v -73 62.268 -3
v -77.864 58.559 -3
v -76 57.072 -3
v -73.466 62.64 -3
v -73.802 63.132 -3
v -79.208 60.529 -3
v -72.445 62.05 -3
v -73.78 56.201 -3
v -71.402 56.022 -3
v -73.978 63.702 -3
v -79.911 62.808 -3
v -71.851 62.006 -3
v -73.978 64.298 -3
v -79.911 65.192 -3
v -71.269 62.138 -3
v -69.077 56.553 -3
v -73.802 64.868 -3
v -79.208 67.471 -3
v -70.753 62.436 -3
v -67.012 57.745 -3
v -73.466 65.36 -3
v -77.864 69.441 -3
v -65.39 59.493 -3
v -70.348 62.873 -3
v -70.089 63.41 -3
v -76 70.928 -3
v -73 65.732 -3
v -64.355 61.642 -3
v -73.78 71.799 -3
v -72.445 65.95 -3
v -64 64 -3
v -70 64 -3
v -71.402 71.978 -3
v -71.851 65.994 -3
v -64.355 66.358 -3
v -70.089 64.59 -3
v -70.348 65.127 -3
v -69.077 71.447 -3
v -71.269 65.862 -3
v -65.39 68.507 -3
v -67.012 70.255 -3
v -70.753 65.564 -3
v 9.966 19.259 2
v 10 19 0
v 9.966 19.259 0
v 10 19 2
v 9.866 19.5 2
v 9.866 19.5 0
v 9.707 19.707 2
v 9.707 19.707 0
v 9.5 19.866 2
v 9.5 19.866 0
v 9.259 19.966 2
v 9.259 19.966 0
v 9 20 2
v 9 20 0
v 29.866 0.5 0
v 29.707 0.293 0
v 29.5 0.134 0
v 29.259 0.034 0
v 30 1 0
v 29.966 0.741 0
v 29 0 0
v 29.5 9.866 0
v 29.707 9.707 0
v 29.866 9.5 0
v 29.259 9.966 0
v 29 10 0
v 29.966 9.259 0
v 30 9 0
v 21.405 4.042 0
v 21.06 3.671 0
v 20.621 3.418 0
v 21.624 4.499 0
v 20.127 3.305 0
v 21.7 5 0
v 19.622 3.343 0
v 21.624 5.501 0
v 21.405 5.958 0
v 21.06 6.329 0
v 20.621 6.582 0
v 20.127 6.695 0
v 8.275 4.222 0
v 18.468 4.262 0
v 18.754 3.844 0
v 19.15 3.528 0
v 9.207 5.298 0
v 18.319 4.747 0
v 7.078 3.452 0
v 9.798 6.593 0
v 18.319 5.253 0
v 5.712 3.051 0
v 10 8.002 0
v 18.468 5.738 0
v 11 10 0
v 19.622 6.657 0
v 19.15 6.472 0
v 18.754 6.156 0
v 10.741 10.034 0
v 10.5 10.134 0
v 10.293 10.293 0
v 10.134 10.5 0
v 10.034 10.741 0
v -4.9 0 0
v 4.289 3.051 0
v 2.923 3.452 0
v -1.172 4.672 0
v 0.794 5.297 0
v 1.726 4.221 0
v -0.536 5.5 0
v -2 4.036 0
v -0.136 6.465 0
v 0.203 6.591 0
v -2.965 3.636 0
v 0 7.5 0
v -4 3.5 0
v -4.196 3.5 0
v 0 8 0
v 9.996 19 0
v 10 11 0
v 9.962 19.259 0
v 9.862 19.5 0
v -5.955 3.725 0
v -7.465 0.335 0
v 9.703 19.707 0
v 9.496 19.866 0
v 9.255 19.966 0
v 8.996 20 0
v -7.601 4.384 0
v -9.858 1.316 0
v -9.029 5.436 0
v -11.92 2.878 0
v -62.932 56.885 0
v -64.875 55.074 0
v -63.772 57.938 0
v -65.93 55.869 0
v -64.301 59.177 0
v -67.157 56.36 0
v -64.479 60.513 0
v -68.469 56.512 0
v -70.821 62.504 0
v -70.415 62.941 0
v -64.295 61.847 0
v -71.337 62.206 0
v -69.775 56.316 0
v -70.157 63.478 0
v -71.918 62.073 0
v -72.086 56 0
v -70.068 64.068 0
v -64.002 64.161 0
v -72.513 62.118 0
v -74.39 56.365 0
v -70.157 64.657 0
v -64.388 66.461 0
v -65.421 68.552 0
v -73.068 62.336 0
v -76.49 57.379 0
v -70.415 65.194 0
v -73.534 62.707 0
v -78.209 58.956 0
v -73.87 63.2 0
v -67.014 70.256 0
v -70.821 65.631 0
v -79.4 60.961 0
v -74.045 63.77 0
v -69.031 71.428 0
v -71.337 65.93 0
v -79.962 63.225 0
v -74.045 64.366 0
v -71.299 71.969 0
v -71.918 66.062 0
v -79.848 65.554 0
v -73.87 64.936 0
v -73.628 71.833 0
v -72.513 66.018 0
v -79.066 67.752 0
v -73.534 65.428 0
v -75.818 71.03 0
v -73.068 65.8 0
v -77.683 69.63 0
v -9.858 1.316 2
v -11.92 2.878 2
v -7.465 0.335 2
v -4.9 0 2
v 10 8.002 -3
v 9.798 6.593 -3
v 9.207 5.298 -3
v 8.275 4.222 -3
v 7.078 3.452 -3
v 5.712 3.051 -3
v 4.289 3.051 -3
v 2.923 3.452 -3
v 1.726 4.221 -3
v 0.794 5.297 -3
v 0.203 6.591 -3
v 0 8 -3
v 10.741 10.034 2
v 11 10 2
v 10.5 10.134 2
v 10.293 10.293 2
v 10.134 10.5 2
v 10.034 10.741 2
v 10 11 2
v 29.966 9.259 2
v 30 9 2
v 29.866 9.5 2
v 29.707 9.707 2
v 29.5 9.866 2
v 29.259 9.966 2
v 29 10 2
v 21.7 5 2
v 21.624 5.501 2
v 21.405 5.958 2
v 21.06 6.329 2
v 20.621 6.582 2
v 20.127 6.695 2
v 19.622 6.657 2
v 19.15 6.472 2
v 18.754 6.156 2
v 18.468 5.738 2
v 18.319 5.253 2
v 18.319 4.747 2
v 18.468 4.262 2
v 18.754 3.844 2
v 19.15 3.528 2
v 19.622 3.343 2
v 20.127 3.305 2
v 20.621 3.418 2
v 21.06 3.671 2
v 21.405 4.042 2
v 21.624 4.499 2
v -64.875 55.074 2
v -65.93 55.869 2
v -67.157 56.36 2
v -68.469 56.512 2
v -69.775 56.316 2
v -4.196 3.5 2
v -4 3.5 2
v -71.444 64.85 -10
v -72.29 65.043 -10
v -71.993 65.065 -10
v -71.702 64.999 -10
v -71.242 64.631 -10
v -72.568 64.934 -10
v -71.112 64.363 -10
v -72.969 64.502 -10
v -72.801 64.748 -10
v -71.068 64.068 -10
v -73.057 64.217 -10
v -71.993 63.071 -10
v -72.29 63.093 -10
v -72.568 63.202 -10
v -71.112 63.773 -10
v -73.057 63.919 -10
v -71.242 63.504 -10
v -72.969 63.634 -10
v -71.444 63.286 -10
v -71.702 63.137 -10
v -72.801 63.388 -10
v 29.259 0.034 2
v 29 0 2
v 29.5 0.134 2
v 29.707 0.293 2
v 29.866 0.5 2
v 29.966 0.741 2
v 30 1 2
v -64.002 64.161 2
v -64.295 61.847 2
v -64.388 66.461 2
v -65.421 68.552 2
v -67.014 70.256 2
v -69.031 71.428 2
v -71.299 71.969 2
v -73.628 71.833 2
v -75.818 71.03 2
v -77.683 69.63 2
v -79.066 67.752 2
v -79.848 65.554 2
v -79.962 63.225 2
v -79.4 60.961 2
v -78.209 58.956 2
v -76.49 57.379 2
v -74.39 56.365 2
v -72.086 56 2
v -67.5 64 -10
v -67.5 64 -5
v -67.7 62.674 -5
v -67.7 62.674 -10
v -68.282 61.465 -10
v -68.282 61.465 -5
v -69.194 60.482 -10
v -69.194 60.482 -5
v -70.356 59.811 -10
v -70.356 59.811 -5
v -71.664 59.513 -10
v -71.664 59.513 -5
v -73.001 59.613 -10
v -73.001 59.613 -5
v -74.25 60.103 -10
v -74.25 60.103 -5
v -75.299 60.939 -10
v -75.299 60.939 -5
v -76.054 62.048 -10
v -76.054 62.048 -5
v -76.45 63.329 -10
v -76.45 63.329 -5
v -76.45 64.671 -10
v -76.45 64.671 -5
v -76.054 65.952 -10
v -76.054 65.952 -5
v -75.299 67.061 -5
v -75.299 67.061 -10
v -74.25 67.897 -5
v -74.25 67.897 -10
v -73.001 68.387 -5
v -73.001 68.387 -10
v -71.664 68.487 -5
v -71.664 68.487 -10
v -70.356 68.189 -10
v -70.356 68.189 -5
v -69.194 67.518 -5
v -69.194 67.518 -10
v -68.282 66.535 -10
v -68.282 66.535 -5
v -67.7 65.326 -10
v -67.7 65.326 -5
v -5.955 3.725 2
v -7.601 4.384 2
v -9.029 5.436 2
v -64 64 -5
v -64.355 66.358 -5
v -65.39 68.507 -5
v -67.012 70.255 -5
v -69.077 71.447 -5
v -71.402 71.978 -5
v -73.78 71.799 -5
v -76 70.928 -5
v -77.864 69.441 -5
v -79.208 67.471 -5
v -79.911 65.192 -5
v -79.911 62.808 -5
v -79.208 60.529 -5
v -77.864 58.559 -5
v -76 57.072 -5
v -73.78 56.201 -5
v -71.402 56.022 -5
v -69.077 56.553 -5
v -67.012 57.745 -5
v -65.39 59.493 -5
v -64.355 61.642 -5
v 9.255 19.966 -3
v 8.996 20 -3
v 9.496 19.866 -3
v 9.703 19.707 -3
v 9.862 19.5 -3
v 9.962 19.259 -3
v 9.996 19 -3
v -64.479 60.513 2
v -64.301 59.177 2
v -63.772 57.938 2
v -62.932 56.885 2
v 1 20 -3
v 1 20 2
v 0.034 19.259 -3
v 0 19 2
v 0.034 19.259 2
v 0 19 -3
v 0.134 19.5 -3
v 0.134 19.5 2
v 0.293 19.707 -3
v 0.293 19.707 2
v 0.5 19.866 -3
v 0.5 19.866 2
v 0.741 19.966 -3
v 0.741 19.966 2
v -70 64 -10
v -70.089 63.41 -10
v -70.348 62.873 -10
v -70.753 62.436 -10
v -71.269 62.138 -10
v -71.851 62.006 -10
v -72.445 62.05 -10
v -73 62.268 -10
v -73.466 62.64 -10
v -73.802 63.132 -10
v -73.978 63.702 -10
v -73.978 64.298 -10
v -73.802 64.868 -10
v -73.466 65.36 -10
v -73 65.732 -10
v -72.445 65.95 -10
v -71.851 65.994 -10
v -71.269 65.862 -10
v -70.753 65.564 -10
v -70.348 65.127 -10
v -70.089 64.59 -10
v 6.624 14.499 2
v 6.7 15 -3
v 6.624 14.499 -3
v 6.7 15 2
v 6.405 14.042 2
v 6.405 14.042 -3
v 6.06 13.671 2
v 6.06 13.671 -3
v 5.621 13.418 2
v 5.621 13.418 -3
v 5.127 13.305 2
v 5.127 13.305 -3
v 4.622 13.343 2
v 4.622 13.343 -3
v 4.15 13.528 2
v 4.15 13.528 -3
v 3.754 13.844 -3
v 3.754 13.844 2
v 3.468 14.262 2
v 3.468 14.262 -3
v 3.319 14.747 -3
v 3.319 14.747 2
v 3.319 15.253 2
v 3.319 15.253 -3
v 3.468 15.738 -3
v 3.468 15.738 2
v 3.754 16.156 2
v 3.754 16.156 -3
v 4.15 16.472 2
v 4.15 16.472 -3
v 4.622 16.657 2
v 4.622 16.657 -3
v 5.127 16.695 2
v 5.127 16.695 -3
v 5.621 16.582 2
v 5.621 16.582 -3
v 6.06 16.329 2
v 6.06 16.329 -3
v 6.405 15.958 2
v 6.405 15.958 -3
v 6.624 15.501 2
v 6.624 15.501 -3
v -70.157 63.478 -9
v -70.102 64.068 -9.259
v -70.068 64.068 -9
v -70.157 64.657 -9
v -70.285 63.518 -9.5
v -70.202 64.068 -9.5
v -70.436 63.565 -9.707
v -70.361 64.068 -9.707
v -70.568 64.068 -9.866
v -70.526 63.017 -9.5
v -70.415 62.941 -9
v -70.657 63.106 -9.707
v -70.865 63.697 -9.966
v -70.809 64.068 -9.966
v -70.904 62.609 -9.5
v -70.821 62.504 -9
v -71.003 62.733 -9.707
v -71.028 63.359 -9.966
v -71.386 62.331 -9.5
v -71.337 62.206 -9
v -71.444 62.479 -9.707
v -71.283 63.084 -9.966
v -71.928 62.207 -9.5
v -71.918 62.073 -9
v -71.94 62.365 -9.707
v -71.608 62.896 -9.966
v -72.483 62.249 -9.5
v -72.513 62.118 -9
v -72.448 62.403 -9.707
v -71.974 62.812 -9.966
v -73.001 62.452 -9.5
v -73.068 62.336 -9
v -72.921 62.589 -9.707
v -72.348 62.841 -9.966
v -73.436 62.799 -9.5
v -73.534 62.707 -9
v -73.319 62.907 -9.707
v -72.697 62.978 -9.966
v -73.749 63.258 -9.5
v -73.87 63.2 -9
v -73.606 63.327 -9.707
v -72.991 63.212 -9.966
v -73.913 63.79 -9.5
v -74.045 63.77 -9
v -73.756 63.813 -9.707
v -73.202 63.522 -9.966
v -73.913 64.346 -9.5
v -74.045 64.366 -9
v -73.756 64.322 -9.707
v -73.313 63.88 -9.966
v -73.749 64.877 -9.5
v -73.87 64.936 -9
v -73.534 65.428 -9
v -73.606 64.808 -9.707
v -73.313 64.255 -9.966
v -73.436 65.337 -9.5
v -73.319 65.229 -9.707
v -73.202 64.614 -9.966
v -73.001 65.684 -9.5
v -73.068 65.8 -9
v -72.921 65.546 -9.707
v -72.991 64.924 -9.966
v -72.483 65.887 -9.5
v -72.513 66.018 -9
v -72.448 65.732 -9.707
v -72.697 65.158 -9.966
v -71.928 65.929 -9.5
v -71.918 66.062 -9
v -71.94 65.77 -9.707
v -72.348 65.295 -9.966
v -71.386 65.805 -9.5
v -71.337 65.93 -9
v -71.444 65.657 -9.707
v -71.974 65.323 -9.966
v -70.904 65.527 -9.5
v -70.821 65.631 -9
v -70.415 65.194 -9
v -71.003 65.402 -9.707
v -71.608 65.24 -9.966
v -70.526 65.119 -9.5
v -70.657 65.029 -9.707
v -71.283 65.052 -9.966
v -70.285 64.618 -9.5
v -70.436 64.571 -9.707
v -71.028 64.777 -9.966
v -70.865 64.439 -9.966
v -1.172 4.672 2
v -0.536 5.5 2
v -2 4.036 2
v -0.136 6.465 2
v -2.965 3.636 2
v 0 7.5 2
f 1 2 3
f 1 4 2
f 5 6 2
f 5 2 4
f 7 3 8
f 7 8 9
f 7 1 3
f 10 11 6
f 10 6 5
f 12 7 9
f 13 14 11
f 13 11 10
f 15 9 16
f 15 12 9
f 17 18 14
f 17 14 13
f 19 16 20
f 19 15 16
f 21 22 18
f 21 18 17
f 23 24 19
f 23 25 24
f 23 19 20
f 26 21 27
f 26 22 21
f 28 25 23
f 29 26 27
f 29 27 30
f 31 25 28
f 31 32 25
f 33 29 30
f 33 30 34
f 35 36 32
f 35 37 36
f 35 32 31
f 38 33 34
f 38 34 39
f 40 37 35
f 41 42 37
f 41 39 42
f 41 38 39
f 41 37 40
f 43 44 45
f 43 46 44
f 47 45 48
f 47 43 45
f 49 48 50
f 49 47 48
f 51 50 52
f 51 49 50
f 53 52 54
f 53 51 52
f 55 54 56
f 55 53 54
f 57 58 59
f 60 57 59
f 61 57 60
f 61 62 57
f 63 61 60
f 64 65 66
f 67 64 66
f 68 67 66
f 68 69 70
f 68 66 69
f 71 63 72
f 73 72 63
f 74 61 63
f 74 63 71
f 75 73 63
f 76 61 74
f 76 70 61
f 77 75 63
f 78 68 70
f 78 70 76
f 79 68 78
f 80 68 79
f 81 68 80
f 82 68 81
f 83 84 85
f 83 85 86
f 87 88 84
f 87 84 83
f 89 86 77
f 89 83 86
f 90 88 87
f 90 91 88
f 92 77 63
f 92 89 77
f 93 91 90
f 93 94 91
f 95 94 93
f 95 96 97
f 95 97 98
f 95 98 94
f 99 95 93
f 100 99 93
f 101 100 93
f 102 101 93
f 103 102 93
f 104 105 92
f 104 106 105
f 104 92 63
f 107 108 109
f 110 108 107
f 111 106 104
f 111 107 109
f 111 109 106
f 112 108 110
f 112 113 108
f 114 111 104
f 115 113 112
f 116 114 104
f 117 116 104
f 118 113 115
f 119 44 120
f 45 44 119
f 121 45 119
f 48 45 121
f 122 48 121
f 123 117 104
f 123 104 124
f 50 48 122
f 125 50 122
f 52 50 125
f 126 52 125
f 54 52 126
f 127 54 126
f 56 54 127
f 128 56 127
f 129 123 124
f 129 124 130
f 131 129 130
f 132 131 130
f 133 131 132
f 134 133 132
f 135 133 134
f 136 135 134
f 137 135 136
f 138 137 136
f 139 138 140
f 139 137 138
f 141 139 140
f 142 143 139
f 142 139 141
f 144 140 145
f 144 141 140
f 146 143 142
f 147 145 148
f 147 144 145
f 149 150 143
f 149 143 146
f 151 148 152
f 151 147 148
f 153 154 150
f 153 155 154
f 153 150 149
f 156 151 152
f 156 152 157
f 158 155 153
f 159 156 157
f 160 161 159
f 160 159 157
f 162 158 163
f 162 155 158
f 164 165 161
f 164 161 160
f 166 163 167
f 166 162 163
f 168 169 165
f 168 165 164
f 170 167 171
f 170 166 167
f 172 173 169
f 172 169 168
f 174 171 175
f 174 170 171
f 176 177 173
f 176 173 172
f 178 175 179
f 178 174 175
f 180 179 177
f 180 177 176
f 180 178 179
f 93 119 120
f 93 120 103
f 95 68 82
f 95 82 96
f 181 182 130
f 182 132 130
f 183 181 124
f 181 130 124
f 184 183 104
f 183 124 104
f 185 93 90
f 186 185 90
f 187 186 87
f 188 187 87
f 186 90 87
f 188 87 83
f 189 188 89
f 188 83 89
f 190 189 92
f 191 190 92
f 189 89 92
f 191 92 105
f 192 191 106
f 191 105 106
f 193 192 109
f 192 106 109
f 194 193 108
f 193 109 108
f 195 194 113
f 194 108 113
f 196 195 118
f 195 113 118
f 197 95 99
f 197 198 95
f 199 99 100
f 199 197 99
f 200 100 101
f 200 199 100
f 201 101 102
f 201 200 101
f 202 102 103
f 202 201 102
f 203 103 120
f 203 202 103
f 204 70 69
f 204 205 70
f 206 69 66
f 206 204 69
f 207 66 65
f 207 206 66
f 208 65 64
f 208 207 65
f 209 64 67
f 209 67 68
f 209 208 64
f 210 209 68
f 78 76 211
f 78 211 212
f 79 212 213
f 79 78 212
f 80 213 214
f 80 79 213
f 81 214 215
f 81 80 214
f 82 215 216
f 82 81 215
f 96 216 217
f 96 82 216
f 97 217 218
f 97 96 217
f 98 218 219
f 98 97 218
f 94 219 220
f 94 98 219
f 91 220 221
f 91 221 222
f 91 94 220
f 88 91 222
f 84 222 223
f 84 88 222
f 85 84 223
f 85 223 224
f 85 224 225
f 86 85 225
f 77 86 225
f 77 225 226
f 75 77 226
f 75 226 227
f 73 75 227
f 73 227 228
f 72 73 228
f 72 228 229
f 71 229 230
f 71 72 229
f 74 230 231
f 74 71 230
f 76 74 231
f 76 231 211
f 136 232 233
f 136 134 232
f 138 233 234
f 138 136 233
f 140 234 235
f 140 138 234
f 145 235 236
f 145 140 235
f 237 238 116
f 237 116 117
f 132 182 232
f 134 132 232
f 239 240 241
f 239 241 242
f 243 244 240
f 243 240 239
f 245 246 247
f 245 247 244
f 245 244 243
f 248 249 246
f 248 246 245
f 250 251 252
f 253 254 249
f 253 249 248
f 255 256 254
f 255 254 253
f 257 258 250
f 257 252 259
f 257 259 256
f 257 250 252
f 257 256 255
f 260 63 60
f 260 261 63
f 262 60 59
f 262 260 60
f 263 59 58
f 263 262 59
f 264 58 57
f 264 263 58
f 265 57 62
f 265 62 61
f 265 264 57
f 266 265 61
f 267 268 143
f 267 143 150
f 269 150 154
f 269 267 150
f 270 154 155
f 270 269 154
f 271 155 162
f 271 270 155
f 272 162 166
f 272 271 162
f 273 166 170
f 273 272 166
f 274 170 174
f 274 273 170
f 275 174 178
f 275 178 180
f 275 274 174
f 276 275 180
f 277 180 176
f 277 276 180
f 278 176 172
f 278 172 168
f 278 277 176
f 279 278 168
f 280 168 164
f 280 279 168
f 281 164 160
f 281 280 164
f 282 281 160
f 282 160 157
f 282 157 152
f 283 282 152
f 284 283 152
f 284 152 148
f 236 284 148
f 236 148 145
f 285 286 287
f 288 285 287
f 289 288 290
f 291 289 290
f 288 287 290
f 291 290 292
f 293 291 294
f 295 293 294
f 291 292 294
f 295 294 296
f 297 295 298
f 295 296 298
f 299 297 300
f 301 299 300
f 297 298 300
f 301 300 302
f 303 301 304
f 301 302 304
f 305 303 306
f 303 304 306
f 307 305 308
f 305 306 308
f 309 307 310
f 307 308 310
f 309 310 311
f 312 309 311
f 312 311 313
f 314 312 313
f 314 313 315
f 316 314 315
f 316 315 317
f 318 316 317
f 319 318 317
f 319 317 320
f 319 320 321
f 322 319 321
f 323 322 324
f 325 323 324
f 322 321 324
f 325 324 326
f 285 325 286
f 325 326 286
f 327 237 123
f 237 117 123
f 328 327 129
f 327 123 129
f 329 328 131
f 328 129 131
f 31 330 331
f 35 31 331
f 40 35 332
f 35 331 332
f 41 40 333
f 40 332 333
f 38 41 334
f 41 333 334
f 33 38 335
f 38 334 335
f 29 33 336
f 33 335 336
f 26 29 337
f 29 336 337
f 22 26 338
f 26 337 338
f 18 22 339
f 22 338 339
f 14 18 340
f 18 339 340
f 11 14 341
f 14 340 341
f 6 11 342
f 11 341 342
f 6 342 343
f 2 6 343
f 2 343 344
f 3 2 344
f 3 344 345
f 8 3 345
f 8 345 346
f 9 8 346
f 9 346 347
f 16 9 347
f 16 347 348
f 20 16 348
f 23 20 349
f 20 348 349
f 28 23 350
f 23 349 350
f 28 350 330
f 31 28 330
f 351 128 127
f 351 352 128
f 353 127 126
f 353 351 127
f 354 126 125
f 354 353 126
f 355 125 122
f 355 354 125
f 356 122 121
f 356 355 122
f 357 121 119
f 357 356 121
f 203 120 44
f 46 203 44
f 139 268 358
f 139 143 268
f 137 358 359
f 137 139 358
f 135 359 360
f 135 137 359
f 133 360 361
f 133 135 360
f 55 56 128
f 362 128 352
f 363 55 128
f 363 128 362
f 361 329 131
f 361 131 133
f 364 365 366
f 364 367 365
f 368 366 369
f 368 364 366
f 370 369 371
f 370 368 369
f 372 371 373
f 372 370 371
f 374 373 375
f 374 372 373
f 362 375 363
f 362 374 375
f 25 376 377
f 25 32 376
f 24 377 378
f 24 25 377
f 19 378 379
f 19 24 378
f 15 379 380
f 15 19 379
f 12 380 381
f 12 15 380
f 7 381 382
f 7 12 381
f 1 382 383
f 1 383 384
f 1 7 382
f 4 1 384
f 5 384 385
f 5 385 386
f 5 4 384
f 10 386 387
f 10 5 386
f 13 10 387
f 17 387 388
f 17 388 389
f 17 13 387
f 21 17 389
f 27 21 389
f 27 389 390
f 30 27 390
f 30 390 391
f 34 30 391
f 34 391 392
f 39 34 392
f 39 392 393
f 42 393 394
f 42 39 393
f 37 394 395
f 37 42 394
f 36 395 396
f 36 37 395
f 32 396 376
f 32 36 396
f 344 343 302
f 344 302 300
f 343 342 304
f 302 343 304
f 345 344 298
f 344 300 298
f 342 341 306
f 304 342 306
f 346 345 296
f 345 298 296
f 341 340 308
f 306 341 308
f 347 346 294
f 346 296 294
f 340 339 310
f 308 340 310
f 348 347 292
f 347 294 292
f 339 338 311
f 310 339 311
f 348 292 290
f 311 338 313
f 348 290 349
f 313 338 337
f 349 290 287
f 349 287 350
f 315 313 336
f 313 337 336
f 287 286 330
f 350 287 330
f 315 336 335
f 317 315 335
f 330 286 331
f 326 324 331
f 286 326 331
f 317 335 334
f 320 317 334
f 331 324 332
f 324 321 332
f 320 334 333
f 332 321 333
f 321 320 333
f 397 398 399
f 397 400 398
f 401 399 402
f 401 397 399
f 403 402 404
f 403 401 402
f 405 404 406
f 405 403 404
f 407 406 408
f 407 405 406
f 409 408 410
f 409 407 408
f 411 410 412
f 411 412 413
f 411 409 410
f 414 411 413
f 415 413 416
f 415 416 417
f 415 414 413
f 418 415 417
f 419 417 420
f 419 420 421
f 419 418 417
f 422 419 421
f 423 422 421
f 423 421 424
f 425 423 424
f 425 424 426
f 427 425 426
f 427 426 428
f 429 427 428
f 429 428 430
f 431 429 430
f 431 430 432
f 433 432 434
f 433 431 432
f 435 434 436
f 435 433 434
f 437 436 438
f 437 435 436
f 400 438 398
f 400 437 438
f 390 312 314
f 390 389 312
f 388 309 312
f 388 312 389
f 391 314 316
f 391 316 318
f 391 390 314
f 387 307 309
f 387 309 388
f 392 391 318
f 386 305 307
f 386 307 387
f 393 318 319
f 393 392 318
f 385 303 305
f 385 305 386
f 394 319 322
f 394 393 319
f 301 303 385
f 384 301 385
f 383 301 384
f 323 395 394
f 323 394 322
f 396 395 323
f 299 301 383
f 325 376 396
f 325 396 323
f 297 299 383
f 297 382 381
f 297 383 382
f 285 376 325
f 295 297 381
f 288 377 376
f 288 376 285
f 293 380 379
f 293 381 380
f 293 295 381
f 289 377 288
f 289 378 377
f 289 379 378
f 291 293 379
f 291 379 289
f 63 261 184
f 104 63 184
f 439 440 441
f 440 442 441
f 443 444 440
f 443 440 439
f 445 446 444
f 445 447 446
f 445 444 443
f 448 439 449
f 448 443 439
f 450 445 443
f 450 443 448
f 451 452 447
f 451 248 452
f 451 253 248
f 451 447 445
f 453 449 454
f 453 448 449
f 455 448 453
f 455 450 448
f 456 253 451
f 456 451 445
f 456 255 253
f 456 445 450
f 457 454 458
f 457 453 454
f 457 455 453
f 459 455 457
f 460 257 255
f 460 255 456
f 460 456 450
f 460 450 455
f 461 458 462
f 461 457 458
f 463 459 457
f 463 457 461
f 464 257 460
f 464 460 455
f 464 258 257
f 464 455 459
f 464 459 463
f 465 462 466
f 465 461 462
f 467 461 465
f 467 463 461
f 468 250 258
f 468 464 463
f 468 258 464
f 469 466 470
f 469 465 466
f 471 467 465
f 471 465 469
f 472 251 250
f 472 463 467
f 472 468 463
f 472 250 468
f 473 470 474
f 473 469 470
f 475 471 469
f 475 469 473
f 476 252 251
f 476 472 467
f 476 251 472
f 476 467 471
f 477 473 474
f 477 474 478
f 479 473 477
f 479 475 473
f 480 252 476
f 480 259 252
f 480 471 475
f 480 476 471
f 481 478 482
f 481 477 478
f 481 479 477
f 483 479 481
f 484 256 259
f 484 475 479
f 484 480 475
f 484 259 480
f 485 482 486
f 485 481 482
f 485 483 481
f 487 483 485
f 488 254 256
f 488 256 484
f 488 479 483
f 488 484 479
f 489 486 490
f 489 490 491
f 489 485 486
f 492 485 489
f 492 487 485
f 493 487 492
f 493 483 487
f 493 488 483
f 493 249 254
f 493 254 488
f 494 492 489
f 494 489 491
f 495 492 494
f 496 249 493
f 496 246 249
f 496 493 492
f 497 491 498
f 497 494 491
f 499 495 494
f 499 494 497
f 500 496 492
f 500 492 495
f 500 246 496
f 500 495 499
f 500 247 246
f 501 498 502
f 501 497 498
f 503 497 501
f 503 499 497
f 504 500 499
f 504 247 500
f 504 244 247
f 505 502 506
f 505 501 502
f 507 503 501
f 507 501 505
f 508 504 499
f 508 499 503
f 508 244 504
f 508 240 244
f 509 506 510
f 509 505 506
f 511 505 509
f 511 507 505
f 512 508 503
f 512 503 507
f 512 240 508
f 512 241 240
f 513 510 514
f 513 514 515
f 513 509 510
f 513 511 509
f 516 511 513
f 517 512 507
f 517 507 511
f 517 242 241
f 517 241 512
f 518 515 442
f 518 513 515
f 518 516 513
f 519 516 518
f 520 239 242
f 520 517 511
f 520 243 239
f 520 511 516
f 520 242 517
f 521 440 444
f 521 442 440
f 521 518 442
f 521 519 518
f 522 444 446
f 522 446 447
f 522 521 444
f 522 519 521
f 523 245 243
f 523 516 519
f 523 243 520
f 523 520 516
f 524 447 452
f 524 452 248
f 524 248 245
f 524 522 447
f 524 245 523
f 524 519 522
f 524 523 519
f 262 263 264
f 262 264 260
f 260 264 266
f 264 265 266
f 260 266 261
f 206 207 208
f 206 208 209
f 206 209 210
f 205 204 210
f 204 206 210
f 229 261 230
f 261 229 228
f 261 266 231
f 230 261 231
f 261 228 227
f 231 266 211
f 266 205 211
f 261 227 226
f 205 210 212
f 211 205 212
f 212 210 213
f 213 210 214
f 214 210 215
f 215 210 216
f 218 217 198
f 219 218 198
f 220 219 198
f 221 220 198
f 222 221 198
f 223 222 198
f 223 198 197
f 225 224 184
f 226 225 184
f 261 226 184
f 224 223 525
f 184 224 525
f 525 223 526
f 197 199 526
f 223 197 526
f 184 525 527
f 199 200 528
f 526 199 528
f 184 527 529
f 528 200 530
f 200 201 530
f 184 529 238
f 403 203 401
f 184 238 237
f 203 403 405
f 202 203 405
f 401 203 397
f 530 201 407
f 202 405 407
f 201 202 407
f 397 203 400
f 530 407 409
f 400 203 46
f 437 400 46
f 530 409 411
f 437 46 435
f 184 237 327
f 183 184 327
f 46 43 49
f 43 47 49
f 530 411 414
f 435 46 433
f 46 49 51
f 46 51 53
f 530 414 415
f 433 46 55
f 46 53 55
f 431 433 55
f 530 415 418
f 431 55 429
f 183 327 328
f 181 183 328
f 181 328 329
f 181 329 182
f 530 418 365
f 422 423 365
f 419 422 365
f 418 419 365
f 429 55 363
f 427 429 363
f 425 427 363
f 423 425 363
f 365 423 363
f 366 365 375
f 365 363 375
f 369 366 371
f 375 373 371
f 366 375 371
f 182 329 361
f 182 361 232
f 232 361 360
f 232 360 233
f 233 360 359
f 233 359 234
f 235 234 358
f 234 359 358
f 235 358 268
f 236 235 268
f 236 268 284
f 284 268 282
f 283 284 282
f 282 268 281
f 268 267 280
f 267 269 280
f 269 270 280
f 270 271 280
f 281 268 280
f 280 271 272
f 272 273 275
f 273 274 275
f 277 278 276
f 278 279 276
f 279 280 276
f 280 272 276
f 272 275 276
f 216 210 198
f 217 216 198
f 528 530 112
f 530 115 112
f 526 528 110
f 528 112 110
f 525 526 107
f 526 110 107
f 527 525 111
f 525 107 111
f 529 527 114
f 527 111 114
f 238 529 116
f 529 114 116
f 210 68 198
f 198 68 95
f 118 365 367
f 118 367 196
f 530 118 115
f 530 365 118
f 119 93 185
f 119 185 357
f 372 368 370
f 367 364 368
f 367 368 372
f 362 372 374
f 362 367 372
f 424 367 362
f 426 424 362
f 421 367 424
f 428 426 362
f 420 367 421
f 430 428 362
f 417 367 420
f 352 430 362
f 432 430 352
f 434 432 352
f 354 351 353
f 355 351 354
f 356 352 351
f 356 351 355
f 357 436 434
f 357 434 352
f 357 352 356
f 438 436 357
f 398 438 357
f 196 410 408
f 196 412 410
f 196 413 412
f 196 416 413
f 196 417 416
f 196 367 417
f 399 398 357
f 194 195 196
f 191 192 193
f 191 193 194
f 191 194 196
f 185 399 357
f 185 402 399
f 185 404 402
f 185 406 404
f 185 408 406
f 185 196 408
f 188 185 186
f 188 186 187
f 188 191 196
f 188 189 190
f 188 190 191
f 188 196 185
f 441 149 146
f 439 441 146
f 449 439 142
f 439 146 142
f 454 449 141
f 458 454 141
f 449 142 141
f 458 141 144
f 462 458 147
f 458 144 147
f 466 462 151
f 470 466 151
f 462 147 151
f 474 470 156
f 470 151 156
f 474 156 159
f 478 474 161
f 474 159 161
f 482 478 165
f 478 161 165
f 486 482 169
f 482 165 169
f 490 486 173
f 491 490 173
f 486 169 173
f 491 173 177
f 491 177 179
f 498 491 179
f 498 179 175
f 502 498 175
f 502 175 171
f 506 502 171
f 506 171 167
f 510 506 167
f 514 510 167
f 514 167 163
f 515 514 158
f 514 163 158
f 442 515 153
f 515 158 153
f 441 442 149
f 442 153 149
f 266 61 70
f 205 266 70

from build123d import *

# Parameters (mm, degrees)
SKETCH_R      = 1.7
PAD_DEPTH     = 2
SKETCH001_R   = 1.7
PAD001_DEPTH  = 3
PAD003_DEPTH  = 2
SKETCH004_R   = 2
PAD004_DEPTH  = 10
FILLET_R      = 1
FILLET001_R   = 1
FILLET002_R   = 4
FILLET003_R   = 7
FILLET004_R   = 10
FILLET005_R   = 1
FILLET006_R   = 5
SKETCH005_R   = 8
SKETCH005_R_2 = 2
PAD005_DEPTH  = 2
SKETCH006_R   = 4.5
SKETCH006_R_2 = 2
PAD006_DEPTH  = 5


with BuildPart() as main:
    # Sketch → Pad (new body)
    with BuildSketch(Plane.XY):
        Polygon((0, 0), (30, 0), (30, 10), (10, 10), (10, 20), (0, 20), align=None)
        with Locations((20, 5)):
            Circle(SKETCH_R, mode=Mode.SUBTRACT)
        with Locations((5, 15)):
            Circle(SKETCH_R, mode=Mode.SUBTRACT)
    extrude(amount=PAD_DEPTH)

    # Sketch001 (on Face9 of Pad) → Pad001 (join)
    with BuildSketch(Plane(origin=(0, 0, 0), x_dir=(1, 0, 0), z_dir=(0, 0, -1))):
        with BuildLine():
            ThreePointArc((10, -8.001658), (5.000821, -3), (0, -8.000017))
            Line((0, -20), (0, -8.000017))
            Line((9.996021, -20), (0, -20))
            Line((10, -8.001658), (9.996021, -20))
        make_face()
        with Locations((5, -15)):
            Circle(SKETCH001_R, mode=Mode.SUBTRACT)
    extrude(amount=PAD001_DEPTH)

    # Sketch003 (on Face5 of Pad001) → Pad003 (join)
    with BuildSketch(Plane.XY.offset(2)):
        with BuildLine():
            Line((0, 0), (-9, 0))
            Line((-9, 0), (-67.33631, 57.5))
            ThreePointArc((-65.5, 59.33631), (-77.656854, 69.656854), (-67.33631, 57.5))
            Line((-7, 3.5), (-65.5, 59.33631))
            Line((0, 3.5), (-7, 3.5))
            Line((0, 0), (0, 3.5))
        make_face()
    extrude(amount=-PAD003_DEPTH)

    # Sketch004 (on Face10 of Pad003) → Pad004 (join)
    with BuildSketch(Plane(origin=(0, 0, 0), x_dir=(1, 0, 0), z_dir=(0, 0, -1))):
        with Locations((-72.067764, -64.067764)):
            Circle(SKETCH004_R)
    extrude(amount=PAD004_DEPTH)

    # Fillet
    fillet_edges = [main.edges().sort_by_distance(p)[0] for p in [
        (9.996021, 20, -1.5),
        (0, 20, -1.5),
    ]]
    fillet(fillet_edges, radius=FILLET_R)

    # Fillet001
    fillet001_edges = [main.edges().sort_by_distance(p)[0] for p in [
        (10, 20, 1),
        (10, 10, 1),
        (30, 10, 1),
        (30, 0, 1),
    ]]
    fillet(fillet001_edges, radius=FILLET001_R)

    # Fillet002
    fillet002_edges = [main.edges().sort_by_distance(p)[0] for p in [
        (0, 3.5, 1),
    ]]
    fillet(fillet002_edges, radius=FILLET002_R)

    # Fillet003
    fillet003_edges = [main.edges().sort_by_distance(p)[0] for p in [
        (-7, 3.5, 1),
    ]]
    fillet(fillet003_edges, radius=FILLET003_R)

    # Fillet004
    fillet004_edges = [main.edges().sort_by_distance(p)[0] for p in [
        (-9, 0, 1),
    ]]
    fillet(fillet004_edges, radius=FILLET004_R)

    # Fillet005
    fillet005_edges = [main.edges().sort_by_distance(p)[0] for p in [
        (-74.067764, 64.067764, -10),
    ]]
    fillet(fillet005_edges, radius=FILLET005_R)

    # Fillet006
    fillet006_edges = [main.edges().sort_by_distance(p)[0] for p in [
        (-65.5, 59.33631, 1),
        (-67.33631, 57.5, 1),
    ]]
    fillet(fillet006_edges, radius=FILLET006_R)


with BuildPart() as cover:
    # Sketch005 → Pad005 (new body)
    with BuildSketch(Plane.XY):
        with Locations((-72, 64)):
            Circle(SKETCH005_R)
        with Locations((-72, 64)):
            Circle(SKETCH005_R_2, mode=Mode.SUBTRACT)
    extrude(amount=PAD005_DEPTH)

    # Sketch006 (on Face3 of Pad005) → Pad006 (join)
    with BuildSketch(Plane(origin=(0, 0, 0), x_dir=(1, 0, 0), z_dir=(0, 0, -1))):
        with Locations((-72, -64)):
            Circle(SKETCH006_R)
        with Locations((-72, -64)):
            Circle(SKETCH006_R_2, mode=Mode.SUBTRACT)
    extrude(amount=PAD006_DEPTH)


with BuildPart() as cover_1:
    # Body placement: moved
    add(cover.part.moved(Location((0, 0, -5))))


solid = Compound([main.part, cover_1.part])
